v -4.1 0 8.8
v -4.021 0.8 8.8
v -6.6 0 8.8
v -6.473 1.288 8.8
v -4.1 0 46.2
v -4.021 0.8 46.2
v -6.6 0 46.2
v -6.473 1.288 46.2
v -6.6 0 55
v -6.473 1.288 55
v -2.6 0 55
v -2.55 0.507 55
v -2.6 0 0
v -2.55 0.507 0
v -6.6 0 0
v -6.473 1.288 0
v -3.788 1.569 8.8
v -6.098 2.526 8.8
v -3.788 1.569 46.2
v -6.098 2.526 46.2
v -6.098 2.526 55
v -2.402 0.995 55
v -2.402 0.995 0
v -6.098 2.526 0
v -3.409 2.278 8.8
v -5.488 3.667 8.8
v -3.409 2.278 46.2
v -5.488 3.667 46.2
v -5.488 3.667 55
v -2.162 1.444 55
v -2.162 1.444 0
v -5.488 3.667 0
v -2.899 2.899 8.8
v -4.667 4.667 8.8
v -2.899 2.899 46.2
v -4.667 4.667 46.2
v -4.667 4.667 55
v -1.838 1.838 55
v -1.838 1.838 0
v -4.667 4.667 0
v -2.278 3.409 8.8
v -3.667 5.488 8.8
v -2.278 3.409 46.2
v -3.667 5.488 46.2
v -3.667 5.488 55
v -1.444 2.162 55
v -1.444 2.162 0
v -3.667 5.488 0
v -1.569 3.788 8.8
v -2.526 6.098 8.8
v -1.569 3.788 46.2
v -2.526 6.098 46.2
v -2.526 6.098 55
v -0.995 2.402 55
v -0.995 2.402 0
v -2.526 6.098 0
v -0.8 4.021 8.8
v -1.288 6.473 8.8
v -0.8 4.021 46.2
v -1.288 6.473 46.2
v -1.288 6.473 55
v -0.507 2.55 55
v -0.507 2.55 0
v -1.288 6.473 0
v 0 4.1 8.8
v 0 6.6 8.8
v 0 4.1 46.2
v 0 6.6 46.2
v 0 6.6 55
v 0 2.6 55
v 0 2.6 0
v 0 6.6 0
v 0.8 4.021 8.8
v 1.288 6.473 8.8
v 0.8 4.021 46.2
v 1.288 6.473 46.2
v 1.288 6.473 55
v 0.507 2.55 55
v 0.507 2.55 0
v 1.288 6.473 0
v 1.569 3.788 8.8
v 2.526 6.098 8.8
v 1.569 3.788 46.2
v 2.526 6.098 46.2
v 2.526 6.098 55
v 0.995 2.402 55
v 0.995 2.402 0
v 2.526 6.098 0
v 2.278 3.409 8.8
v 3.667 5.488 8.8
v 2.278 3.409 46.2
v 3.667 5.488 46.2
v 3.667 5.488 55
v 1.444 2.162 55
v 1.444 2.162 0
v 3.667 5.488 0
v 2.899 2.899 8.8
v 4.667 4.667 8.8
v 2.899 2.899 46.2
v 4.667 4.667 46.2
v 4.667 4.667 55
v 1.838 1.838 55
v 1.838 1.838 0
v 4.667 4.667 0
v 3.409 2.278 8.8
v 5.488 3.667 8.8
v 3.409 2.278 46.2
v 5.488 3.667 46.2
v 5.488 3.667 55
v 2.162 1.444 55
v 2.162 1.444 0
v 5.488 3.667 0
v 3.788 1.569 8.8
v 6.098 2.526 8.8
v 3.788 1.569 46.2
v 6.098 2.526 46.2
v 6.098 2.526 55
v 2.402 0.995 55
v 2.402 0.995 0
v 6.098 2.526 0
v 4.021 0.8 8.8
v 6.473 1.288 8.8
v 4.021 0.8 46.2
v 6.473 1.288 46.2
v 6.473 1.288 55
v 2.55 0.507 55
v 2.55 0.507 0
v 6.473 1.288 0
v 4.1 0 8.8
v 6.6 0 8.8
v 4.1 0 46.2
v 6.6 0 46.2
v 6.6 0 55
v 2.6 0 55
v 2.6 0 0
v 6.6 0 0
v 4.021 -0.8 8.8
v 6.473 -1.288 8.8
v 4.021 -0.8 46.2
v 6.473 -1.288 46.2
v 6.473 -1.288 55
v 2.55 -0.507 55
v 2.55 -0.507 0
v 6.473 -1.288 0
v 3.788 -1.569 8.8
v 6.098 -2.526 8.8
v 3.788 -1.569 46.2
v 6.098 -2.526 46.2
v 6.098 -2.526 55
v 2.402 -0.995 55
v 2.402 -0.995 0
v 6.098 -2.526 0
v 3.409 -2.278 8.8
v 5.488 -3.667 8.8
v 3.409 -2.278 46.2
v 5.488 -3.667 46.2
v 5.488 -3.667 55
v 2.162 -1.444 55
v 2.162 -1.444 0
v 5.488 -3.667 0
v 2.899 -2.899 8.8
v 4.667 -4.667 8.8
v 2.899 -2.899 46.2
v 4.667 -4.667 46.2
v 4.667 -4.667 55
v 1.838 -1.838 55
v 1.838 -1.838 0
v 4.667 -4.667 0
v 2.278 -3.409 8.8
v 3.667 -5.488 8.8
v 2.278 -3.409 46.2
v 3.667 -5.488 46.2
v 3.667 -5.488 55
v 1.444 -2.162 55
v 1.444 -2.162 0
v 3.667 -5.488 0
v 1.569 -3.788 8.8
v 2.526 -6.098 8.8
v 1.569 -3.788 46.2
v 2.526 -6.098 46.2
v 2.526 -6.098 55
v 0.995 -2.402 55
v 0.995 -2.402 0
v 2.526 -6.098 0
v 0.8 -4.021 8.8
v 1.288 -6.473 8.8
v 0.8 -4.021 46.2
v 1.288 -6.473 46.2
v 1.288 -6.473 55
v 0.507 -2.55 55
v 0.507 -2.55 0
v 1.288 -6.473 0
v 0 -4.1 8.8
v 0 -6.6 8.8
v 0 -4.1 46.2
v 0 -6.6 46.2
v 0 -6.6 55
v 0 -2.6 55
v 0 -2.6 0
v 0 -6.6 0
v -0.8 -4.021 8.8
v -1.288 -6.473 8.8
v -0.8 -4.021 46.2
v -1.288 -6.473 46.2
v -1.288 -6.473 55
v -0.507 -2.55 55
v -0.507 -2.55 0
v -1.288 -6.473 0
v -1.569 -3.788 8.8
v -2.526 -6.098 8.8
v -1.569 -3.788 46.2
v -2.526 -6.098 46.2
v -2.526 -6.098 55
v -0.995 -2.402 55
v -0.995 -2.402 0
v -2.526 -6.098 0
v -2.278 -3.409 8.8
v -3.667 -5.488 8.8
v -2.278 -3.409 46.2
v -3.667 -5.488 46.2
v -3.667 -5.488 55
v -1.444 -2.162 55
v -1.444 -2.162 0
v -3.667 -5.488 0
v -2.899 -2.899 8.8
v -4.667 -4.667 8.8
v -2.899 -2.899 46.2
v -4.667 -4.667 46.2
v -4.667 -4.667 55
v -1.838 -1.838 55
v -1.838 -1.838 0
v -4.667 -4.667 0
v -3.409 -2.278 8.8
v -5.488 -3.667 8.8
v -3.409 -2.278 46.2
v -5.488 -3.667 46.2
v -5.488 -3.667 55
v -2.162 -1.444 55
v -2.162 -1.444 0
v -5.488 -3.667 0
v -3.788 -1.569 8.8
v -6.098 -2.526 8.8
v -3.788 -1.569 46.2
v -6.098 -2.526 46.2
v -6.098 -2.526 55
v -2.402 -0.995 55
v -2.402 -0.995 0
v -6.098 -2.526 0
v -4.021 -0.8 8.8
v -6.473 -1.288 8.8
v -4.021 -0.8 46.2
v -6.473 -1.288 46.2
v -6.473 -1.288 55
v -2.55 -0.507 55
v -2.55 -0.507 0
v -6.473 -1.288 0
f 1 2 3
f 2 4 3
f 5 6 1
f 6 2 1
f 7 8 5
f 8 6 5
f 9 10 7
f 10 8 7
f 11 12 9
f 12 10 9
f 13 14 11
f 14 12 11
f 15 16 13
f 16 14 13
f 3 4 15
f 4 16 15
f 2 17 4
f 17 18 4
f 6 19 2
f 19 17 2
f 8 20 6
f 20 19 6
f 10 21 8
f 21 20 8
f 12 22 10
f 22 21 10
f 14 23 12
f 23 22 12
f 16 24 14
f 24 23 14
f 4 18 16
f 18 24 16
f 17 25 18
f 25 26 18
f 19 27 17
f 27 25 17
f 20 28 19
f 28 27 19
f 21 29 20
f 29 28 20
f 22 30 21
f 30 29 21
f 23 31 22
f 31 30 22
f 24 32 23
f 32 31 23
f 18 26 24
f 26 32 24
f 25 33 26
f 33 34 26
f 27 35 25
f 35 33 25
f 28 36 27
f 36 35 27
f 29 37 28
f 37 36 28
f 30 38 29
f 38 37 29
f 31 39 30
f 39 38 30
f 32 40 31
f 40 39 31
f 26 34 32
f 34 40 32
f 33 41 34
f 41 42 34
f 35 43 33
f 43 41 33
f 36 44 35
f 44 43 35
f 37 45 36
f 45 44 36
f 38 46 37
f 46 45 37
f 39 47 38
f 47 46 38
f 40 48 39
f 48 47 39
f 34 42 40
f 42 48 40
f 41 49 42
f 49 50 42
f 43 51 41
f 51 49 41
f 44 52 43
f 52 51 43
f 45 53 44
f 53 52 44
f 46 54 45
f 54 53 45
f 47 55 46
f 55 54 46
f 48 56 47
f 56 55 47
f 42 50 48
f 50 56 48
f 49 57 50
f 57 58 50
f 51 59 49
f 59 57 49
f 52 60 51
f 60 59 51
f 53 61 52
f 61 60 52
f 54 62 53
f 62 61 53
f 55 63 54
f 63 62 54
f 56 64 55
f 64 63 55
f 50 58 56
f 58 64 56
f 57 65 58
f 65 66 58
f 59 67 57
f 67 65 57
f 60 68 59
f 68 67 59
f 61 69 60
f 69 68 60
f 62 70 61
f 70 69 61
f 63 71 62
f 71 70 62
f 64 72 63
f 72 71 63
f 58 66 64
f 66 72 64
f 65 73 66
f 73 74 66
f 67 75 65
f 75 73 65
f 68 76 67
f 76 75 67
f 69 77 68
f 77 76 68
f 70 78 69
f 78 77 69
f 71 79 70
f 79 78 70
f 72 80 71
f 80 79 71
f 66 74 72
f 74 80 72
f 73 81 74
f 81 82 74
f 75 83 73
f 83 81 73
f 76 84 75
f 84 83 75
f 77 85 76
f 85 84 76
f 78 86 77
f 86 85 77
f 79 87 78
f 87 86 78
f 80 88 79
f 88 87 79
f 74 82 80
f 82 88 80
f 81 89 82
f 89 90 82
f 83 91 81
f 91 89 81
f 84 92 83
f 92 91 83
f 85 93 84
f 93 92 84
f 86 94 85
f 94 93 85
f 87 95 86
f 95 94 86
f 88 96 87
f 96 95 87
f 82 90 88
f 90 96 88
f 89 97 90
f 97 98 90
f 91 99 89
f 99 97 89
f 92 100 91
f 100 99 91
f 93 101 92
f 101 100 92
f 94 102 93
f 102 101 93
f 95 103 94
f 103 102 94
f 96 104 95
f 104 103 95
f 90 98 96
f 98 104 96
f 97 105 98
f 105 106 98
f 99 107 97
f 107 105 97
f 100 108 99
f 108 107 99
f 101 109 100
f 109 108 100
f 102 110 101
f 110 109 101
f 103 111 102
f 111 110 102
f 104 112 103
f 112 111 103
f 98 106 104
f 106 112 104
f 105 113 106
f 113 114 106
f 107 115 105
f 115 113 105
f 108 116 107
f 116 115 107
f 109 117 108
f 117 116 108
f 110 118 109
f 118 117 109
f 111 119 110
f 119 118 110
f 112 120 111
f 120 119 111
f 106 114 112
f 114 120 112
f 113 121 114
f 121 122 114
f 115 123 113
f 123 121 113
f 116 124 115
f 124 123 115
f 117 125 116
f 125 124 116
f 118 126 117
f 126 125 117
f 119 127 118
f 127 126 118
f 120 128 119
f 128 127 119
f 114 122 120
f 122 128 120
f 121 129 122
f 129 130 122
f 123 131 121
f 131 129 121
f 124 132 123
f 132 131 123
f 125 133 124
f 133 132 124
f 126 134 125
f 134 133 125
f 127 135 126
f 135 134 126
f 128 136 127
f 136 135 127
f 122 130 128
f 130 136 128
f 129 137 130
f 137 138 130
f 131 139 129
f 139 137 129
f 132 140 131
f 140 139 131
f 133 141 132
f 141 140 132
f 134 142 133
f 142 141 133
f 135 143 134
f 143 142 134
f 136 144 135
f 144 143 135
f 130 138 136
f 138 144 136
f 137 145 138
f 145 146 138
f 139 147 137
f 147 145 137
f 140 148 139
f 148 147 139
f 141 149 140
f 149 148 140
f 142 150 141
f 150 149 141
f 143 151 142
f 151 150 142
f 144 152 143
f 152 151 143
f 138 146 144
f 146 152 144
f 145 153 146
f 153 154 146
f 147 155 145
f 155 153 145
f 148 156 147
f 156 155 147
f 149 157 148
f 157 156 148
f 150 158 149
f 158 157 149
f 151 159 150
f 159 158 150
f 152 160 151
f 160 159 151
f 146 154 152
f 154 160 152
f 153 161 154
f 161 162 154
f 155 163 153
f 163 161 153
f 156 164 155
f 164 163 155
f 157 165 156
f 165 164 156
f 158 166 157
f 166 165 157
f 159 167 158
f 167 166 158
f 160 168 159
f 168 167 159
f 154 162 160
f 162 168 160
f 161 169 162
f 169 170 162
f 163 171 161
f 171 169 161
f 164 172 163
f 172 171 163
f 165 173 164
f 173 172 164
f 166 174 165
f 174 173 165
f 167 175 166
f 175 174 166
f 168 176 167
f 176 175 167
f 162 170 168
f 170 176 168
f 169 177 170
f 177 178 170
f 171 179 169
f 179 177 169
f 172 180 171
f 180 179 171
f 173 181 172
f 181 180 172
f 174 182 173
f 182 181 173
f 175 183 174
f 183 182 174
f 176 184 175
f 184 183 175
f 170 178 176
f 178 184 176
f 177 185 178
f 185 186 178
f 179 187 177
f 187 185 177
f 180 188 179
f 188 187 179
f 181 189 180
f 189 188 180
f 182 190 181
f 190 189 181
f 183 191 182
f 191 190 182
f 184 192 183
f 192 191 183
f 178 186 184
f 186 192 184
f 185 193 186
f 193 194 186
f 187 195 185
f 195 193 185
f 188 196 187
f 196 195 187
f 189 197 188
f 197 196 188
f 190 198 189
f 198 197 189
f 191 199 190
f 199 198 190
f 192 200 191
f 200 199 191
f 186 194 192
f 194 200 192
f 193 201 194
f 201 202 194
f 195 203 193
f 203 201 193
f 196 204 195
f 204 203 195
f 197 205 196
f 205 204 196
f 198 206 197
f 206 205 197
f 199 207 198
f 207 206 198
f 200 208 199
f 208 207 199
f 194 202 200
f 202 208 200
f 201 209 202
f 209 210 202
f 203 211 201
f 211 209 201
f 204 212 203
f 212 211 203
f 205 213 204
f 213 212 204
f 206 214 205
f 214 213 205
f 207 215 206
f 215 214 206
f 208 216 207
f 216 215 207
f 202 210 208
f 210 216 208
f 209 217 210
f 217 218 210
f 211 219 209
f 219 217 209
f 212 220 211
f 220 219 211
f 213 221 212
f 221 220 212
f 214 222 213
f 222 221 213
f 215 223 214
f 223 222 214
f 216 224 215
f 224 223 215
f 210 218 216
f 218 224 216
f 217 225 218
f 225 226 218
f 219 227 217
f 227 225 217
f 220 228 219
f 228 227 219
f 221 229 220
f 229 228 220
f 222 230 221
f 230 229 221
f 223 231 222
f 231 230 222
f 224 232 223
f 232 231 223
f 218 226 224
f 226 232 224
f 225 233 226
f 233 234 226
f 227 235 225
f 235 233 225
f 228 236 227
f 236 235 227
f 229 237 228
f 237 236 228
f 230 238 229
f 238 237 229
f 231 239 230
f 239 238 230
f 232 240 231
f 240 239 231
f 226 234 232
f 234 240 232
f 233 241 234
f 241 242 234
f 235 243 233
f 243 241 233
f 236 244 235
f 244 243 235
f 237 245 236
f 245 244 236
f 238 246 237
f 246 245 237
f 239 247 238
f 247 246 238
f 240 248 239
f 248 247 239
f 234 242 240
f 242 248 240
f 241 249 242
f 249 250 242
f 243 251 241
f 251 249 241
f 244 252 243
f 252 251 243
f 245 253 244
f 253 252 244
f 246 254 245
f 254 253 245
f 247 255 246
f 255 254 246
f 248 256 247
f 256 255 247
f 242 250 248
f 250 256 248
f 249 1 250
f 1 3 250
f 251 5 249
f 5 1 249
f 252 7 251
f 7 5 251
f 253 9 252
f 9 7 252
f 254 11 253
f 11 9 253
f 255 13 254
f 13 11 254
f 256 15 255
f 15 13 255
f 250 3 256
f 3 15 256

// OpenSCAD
$fn = 32;

// ----------------------------------------------------------------------
// Profiled standoff: spool spacer, 55 mm long, bore 5.2 mm
// ----------------------------------------------------------------------

// --- parameters (mm) ---
revolve_angle = 360;      // full turn around the Z axis
profile_points = 8;       // points of the closed outline

profile = [[2.6, 0], [6.6, 0], [6.6, 8.8], [4.1, 8.8], [4.1, 46.2], [6.6, 46.2], [6.6, 55], [2.6, 55]];  // single closed polygon, 8 points, counter clockwise

// --- the one profile operation ---
rotate_extrude(angle = revolve_angle) polygon(points = profile);
